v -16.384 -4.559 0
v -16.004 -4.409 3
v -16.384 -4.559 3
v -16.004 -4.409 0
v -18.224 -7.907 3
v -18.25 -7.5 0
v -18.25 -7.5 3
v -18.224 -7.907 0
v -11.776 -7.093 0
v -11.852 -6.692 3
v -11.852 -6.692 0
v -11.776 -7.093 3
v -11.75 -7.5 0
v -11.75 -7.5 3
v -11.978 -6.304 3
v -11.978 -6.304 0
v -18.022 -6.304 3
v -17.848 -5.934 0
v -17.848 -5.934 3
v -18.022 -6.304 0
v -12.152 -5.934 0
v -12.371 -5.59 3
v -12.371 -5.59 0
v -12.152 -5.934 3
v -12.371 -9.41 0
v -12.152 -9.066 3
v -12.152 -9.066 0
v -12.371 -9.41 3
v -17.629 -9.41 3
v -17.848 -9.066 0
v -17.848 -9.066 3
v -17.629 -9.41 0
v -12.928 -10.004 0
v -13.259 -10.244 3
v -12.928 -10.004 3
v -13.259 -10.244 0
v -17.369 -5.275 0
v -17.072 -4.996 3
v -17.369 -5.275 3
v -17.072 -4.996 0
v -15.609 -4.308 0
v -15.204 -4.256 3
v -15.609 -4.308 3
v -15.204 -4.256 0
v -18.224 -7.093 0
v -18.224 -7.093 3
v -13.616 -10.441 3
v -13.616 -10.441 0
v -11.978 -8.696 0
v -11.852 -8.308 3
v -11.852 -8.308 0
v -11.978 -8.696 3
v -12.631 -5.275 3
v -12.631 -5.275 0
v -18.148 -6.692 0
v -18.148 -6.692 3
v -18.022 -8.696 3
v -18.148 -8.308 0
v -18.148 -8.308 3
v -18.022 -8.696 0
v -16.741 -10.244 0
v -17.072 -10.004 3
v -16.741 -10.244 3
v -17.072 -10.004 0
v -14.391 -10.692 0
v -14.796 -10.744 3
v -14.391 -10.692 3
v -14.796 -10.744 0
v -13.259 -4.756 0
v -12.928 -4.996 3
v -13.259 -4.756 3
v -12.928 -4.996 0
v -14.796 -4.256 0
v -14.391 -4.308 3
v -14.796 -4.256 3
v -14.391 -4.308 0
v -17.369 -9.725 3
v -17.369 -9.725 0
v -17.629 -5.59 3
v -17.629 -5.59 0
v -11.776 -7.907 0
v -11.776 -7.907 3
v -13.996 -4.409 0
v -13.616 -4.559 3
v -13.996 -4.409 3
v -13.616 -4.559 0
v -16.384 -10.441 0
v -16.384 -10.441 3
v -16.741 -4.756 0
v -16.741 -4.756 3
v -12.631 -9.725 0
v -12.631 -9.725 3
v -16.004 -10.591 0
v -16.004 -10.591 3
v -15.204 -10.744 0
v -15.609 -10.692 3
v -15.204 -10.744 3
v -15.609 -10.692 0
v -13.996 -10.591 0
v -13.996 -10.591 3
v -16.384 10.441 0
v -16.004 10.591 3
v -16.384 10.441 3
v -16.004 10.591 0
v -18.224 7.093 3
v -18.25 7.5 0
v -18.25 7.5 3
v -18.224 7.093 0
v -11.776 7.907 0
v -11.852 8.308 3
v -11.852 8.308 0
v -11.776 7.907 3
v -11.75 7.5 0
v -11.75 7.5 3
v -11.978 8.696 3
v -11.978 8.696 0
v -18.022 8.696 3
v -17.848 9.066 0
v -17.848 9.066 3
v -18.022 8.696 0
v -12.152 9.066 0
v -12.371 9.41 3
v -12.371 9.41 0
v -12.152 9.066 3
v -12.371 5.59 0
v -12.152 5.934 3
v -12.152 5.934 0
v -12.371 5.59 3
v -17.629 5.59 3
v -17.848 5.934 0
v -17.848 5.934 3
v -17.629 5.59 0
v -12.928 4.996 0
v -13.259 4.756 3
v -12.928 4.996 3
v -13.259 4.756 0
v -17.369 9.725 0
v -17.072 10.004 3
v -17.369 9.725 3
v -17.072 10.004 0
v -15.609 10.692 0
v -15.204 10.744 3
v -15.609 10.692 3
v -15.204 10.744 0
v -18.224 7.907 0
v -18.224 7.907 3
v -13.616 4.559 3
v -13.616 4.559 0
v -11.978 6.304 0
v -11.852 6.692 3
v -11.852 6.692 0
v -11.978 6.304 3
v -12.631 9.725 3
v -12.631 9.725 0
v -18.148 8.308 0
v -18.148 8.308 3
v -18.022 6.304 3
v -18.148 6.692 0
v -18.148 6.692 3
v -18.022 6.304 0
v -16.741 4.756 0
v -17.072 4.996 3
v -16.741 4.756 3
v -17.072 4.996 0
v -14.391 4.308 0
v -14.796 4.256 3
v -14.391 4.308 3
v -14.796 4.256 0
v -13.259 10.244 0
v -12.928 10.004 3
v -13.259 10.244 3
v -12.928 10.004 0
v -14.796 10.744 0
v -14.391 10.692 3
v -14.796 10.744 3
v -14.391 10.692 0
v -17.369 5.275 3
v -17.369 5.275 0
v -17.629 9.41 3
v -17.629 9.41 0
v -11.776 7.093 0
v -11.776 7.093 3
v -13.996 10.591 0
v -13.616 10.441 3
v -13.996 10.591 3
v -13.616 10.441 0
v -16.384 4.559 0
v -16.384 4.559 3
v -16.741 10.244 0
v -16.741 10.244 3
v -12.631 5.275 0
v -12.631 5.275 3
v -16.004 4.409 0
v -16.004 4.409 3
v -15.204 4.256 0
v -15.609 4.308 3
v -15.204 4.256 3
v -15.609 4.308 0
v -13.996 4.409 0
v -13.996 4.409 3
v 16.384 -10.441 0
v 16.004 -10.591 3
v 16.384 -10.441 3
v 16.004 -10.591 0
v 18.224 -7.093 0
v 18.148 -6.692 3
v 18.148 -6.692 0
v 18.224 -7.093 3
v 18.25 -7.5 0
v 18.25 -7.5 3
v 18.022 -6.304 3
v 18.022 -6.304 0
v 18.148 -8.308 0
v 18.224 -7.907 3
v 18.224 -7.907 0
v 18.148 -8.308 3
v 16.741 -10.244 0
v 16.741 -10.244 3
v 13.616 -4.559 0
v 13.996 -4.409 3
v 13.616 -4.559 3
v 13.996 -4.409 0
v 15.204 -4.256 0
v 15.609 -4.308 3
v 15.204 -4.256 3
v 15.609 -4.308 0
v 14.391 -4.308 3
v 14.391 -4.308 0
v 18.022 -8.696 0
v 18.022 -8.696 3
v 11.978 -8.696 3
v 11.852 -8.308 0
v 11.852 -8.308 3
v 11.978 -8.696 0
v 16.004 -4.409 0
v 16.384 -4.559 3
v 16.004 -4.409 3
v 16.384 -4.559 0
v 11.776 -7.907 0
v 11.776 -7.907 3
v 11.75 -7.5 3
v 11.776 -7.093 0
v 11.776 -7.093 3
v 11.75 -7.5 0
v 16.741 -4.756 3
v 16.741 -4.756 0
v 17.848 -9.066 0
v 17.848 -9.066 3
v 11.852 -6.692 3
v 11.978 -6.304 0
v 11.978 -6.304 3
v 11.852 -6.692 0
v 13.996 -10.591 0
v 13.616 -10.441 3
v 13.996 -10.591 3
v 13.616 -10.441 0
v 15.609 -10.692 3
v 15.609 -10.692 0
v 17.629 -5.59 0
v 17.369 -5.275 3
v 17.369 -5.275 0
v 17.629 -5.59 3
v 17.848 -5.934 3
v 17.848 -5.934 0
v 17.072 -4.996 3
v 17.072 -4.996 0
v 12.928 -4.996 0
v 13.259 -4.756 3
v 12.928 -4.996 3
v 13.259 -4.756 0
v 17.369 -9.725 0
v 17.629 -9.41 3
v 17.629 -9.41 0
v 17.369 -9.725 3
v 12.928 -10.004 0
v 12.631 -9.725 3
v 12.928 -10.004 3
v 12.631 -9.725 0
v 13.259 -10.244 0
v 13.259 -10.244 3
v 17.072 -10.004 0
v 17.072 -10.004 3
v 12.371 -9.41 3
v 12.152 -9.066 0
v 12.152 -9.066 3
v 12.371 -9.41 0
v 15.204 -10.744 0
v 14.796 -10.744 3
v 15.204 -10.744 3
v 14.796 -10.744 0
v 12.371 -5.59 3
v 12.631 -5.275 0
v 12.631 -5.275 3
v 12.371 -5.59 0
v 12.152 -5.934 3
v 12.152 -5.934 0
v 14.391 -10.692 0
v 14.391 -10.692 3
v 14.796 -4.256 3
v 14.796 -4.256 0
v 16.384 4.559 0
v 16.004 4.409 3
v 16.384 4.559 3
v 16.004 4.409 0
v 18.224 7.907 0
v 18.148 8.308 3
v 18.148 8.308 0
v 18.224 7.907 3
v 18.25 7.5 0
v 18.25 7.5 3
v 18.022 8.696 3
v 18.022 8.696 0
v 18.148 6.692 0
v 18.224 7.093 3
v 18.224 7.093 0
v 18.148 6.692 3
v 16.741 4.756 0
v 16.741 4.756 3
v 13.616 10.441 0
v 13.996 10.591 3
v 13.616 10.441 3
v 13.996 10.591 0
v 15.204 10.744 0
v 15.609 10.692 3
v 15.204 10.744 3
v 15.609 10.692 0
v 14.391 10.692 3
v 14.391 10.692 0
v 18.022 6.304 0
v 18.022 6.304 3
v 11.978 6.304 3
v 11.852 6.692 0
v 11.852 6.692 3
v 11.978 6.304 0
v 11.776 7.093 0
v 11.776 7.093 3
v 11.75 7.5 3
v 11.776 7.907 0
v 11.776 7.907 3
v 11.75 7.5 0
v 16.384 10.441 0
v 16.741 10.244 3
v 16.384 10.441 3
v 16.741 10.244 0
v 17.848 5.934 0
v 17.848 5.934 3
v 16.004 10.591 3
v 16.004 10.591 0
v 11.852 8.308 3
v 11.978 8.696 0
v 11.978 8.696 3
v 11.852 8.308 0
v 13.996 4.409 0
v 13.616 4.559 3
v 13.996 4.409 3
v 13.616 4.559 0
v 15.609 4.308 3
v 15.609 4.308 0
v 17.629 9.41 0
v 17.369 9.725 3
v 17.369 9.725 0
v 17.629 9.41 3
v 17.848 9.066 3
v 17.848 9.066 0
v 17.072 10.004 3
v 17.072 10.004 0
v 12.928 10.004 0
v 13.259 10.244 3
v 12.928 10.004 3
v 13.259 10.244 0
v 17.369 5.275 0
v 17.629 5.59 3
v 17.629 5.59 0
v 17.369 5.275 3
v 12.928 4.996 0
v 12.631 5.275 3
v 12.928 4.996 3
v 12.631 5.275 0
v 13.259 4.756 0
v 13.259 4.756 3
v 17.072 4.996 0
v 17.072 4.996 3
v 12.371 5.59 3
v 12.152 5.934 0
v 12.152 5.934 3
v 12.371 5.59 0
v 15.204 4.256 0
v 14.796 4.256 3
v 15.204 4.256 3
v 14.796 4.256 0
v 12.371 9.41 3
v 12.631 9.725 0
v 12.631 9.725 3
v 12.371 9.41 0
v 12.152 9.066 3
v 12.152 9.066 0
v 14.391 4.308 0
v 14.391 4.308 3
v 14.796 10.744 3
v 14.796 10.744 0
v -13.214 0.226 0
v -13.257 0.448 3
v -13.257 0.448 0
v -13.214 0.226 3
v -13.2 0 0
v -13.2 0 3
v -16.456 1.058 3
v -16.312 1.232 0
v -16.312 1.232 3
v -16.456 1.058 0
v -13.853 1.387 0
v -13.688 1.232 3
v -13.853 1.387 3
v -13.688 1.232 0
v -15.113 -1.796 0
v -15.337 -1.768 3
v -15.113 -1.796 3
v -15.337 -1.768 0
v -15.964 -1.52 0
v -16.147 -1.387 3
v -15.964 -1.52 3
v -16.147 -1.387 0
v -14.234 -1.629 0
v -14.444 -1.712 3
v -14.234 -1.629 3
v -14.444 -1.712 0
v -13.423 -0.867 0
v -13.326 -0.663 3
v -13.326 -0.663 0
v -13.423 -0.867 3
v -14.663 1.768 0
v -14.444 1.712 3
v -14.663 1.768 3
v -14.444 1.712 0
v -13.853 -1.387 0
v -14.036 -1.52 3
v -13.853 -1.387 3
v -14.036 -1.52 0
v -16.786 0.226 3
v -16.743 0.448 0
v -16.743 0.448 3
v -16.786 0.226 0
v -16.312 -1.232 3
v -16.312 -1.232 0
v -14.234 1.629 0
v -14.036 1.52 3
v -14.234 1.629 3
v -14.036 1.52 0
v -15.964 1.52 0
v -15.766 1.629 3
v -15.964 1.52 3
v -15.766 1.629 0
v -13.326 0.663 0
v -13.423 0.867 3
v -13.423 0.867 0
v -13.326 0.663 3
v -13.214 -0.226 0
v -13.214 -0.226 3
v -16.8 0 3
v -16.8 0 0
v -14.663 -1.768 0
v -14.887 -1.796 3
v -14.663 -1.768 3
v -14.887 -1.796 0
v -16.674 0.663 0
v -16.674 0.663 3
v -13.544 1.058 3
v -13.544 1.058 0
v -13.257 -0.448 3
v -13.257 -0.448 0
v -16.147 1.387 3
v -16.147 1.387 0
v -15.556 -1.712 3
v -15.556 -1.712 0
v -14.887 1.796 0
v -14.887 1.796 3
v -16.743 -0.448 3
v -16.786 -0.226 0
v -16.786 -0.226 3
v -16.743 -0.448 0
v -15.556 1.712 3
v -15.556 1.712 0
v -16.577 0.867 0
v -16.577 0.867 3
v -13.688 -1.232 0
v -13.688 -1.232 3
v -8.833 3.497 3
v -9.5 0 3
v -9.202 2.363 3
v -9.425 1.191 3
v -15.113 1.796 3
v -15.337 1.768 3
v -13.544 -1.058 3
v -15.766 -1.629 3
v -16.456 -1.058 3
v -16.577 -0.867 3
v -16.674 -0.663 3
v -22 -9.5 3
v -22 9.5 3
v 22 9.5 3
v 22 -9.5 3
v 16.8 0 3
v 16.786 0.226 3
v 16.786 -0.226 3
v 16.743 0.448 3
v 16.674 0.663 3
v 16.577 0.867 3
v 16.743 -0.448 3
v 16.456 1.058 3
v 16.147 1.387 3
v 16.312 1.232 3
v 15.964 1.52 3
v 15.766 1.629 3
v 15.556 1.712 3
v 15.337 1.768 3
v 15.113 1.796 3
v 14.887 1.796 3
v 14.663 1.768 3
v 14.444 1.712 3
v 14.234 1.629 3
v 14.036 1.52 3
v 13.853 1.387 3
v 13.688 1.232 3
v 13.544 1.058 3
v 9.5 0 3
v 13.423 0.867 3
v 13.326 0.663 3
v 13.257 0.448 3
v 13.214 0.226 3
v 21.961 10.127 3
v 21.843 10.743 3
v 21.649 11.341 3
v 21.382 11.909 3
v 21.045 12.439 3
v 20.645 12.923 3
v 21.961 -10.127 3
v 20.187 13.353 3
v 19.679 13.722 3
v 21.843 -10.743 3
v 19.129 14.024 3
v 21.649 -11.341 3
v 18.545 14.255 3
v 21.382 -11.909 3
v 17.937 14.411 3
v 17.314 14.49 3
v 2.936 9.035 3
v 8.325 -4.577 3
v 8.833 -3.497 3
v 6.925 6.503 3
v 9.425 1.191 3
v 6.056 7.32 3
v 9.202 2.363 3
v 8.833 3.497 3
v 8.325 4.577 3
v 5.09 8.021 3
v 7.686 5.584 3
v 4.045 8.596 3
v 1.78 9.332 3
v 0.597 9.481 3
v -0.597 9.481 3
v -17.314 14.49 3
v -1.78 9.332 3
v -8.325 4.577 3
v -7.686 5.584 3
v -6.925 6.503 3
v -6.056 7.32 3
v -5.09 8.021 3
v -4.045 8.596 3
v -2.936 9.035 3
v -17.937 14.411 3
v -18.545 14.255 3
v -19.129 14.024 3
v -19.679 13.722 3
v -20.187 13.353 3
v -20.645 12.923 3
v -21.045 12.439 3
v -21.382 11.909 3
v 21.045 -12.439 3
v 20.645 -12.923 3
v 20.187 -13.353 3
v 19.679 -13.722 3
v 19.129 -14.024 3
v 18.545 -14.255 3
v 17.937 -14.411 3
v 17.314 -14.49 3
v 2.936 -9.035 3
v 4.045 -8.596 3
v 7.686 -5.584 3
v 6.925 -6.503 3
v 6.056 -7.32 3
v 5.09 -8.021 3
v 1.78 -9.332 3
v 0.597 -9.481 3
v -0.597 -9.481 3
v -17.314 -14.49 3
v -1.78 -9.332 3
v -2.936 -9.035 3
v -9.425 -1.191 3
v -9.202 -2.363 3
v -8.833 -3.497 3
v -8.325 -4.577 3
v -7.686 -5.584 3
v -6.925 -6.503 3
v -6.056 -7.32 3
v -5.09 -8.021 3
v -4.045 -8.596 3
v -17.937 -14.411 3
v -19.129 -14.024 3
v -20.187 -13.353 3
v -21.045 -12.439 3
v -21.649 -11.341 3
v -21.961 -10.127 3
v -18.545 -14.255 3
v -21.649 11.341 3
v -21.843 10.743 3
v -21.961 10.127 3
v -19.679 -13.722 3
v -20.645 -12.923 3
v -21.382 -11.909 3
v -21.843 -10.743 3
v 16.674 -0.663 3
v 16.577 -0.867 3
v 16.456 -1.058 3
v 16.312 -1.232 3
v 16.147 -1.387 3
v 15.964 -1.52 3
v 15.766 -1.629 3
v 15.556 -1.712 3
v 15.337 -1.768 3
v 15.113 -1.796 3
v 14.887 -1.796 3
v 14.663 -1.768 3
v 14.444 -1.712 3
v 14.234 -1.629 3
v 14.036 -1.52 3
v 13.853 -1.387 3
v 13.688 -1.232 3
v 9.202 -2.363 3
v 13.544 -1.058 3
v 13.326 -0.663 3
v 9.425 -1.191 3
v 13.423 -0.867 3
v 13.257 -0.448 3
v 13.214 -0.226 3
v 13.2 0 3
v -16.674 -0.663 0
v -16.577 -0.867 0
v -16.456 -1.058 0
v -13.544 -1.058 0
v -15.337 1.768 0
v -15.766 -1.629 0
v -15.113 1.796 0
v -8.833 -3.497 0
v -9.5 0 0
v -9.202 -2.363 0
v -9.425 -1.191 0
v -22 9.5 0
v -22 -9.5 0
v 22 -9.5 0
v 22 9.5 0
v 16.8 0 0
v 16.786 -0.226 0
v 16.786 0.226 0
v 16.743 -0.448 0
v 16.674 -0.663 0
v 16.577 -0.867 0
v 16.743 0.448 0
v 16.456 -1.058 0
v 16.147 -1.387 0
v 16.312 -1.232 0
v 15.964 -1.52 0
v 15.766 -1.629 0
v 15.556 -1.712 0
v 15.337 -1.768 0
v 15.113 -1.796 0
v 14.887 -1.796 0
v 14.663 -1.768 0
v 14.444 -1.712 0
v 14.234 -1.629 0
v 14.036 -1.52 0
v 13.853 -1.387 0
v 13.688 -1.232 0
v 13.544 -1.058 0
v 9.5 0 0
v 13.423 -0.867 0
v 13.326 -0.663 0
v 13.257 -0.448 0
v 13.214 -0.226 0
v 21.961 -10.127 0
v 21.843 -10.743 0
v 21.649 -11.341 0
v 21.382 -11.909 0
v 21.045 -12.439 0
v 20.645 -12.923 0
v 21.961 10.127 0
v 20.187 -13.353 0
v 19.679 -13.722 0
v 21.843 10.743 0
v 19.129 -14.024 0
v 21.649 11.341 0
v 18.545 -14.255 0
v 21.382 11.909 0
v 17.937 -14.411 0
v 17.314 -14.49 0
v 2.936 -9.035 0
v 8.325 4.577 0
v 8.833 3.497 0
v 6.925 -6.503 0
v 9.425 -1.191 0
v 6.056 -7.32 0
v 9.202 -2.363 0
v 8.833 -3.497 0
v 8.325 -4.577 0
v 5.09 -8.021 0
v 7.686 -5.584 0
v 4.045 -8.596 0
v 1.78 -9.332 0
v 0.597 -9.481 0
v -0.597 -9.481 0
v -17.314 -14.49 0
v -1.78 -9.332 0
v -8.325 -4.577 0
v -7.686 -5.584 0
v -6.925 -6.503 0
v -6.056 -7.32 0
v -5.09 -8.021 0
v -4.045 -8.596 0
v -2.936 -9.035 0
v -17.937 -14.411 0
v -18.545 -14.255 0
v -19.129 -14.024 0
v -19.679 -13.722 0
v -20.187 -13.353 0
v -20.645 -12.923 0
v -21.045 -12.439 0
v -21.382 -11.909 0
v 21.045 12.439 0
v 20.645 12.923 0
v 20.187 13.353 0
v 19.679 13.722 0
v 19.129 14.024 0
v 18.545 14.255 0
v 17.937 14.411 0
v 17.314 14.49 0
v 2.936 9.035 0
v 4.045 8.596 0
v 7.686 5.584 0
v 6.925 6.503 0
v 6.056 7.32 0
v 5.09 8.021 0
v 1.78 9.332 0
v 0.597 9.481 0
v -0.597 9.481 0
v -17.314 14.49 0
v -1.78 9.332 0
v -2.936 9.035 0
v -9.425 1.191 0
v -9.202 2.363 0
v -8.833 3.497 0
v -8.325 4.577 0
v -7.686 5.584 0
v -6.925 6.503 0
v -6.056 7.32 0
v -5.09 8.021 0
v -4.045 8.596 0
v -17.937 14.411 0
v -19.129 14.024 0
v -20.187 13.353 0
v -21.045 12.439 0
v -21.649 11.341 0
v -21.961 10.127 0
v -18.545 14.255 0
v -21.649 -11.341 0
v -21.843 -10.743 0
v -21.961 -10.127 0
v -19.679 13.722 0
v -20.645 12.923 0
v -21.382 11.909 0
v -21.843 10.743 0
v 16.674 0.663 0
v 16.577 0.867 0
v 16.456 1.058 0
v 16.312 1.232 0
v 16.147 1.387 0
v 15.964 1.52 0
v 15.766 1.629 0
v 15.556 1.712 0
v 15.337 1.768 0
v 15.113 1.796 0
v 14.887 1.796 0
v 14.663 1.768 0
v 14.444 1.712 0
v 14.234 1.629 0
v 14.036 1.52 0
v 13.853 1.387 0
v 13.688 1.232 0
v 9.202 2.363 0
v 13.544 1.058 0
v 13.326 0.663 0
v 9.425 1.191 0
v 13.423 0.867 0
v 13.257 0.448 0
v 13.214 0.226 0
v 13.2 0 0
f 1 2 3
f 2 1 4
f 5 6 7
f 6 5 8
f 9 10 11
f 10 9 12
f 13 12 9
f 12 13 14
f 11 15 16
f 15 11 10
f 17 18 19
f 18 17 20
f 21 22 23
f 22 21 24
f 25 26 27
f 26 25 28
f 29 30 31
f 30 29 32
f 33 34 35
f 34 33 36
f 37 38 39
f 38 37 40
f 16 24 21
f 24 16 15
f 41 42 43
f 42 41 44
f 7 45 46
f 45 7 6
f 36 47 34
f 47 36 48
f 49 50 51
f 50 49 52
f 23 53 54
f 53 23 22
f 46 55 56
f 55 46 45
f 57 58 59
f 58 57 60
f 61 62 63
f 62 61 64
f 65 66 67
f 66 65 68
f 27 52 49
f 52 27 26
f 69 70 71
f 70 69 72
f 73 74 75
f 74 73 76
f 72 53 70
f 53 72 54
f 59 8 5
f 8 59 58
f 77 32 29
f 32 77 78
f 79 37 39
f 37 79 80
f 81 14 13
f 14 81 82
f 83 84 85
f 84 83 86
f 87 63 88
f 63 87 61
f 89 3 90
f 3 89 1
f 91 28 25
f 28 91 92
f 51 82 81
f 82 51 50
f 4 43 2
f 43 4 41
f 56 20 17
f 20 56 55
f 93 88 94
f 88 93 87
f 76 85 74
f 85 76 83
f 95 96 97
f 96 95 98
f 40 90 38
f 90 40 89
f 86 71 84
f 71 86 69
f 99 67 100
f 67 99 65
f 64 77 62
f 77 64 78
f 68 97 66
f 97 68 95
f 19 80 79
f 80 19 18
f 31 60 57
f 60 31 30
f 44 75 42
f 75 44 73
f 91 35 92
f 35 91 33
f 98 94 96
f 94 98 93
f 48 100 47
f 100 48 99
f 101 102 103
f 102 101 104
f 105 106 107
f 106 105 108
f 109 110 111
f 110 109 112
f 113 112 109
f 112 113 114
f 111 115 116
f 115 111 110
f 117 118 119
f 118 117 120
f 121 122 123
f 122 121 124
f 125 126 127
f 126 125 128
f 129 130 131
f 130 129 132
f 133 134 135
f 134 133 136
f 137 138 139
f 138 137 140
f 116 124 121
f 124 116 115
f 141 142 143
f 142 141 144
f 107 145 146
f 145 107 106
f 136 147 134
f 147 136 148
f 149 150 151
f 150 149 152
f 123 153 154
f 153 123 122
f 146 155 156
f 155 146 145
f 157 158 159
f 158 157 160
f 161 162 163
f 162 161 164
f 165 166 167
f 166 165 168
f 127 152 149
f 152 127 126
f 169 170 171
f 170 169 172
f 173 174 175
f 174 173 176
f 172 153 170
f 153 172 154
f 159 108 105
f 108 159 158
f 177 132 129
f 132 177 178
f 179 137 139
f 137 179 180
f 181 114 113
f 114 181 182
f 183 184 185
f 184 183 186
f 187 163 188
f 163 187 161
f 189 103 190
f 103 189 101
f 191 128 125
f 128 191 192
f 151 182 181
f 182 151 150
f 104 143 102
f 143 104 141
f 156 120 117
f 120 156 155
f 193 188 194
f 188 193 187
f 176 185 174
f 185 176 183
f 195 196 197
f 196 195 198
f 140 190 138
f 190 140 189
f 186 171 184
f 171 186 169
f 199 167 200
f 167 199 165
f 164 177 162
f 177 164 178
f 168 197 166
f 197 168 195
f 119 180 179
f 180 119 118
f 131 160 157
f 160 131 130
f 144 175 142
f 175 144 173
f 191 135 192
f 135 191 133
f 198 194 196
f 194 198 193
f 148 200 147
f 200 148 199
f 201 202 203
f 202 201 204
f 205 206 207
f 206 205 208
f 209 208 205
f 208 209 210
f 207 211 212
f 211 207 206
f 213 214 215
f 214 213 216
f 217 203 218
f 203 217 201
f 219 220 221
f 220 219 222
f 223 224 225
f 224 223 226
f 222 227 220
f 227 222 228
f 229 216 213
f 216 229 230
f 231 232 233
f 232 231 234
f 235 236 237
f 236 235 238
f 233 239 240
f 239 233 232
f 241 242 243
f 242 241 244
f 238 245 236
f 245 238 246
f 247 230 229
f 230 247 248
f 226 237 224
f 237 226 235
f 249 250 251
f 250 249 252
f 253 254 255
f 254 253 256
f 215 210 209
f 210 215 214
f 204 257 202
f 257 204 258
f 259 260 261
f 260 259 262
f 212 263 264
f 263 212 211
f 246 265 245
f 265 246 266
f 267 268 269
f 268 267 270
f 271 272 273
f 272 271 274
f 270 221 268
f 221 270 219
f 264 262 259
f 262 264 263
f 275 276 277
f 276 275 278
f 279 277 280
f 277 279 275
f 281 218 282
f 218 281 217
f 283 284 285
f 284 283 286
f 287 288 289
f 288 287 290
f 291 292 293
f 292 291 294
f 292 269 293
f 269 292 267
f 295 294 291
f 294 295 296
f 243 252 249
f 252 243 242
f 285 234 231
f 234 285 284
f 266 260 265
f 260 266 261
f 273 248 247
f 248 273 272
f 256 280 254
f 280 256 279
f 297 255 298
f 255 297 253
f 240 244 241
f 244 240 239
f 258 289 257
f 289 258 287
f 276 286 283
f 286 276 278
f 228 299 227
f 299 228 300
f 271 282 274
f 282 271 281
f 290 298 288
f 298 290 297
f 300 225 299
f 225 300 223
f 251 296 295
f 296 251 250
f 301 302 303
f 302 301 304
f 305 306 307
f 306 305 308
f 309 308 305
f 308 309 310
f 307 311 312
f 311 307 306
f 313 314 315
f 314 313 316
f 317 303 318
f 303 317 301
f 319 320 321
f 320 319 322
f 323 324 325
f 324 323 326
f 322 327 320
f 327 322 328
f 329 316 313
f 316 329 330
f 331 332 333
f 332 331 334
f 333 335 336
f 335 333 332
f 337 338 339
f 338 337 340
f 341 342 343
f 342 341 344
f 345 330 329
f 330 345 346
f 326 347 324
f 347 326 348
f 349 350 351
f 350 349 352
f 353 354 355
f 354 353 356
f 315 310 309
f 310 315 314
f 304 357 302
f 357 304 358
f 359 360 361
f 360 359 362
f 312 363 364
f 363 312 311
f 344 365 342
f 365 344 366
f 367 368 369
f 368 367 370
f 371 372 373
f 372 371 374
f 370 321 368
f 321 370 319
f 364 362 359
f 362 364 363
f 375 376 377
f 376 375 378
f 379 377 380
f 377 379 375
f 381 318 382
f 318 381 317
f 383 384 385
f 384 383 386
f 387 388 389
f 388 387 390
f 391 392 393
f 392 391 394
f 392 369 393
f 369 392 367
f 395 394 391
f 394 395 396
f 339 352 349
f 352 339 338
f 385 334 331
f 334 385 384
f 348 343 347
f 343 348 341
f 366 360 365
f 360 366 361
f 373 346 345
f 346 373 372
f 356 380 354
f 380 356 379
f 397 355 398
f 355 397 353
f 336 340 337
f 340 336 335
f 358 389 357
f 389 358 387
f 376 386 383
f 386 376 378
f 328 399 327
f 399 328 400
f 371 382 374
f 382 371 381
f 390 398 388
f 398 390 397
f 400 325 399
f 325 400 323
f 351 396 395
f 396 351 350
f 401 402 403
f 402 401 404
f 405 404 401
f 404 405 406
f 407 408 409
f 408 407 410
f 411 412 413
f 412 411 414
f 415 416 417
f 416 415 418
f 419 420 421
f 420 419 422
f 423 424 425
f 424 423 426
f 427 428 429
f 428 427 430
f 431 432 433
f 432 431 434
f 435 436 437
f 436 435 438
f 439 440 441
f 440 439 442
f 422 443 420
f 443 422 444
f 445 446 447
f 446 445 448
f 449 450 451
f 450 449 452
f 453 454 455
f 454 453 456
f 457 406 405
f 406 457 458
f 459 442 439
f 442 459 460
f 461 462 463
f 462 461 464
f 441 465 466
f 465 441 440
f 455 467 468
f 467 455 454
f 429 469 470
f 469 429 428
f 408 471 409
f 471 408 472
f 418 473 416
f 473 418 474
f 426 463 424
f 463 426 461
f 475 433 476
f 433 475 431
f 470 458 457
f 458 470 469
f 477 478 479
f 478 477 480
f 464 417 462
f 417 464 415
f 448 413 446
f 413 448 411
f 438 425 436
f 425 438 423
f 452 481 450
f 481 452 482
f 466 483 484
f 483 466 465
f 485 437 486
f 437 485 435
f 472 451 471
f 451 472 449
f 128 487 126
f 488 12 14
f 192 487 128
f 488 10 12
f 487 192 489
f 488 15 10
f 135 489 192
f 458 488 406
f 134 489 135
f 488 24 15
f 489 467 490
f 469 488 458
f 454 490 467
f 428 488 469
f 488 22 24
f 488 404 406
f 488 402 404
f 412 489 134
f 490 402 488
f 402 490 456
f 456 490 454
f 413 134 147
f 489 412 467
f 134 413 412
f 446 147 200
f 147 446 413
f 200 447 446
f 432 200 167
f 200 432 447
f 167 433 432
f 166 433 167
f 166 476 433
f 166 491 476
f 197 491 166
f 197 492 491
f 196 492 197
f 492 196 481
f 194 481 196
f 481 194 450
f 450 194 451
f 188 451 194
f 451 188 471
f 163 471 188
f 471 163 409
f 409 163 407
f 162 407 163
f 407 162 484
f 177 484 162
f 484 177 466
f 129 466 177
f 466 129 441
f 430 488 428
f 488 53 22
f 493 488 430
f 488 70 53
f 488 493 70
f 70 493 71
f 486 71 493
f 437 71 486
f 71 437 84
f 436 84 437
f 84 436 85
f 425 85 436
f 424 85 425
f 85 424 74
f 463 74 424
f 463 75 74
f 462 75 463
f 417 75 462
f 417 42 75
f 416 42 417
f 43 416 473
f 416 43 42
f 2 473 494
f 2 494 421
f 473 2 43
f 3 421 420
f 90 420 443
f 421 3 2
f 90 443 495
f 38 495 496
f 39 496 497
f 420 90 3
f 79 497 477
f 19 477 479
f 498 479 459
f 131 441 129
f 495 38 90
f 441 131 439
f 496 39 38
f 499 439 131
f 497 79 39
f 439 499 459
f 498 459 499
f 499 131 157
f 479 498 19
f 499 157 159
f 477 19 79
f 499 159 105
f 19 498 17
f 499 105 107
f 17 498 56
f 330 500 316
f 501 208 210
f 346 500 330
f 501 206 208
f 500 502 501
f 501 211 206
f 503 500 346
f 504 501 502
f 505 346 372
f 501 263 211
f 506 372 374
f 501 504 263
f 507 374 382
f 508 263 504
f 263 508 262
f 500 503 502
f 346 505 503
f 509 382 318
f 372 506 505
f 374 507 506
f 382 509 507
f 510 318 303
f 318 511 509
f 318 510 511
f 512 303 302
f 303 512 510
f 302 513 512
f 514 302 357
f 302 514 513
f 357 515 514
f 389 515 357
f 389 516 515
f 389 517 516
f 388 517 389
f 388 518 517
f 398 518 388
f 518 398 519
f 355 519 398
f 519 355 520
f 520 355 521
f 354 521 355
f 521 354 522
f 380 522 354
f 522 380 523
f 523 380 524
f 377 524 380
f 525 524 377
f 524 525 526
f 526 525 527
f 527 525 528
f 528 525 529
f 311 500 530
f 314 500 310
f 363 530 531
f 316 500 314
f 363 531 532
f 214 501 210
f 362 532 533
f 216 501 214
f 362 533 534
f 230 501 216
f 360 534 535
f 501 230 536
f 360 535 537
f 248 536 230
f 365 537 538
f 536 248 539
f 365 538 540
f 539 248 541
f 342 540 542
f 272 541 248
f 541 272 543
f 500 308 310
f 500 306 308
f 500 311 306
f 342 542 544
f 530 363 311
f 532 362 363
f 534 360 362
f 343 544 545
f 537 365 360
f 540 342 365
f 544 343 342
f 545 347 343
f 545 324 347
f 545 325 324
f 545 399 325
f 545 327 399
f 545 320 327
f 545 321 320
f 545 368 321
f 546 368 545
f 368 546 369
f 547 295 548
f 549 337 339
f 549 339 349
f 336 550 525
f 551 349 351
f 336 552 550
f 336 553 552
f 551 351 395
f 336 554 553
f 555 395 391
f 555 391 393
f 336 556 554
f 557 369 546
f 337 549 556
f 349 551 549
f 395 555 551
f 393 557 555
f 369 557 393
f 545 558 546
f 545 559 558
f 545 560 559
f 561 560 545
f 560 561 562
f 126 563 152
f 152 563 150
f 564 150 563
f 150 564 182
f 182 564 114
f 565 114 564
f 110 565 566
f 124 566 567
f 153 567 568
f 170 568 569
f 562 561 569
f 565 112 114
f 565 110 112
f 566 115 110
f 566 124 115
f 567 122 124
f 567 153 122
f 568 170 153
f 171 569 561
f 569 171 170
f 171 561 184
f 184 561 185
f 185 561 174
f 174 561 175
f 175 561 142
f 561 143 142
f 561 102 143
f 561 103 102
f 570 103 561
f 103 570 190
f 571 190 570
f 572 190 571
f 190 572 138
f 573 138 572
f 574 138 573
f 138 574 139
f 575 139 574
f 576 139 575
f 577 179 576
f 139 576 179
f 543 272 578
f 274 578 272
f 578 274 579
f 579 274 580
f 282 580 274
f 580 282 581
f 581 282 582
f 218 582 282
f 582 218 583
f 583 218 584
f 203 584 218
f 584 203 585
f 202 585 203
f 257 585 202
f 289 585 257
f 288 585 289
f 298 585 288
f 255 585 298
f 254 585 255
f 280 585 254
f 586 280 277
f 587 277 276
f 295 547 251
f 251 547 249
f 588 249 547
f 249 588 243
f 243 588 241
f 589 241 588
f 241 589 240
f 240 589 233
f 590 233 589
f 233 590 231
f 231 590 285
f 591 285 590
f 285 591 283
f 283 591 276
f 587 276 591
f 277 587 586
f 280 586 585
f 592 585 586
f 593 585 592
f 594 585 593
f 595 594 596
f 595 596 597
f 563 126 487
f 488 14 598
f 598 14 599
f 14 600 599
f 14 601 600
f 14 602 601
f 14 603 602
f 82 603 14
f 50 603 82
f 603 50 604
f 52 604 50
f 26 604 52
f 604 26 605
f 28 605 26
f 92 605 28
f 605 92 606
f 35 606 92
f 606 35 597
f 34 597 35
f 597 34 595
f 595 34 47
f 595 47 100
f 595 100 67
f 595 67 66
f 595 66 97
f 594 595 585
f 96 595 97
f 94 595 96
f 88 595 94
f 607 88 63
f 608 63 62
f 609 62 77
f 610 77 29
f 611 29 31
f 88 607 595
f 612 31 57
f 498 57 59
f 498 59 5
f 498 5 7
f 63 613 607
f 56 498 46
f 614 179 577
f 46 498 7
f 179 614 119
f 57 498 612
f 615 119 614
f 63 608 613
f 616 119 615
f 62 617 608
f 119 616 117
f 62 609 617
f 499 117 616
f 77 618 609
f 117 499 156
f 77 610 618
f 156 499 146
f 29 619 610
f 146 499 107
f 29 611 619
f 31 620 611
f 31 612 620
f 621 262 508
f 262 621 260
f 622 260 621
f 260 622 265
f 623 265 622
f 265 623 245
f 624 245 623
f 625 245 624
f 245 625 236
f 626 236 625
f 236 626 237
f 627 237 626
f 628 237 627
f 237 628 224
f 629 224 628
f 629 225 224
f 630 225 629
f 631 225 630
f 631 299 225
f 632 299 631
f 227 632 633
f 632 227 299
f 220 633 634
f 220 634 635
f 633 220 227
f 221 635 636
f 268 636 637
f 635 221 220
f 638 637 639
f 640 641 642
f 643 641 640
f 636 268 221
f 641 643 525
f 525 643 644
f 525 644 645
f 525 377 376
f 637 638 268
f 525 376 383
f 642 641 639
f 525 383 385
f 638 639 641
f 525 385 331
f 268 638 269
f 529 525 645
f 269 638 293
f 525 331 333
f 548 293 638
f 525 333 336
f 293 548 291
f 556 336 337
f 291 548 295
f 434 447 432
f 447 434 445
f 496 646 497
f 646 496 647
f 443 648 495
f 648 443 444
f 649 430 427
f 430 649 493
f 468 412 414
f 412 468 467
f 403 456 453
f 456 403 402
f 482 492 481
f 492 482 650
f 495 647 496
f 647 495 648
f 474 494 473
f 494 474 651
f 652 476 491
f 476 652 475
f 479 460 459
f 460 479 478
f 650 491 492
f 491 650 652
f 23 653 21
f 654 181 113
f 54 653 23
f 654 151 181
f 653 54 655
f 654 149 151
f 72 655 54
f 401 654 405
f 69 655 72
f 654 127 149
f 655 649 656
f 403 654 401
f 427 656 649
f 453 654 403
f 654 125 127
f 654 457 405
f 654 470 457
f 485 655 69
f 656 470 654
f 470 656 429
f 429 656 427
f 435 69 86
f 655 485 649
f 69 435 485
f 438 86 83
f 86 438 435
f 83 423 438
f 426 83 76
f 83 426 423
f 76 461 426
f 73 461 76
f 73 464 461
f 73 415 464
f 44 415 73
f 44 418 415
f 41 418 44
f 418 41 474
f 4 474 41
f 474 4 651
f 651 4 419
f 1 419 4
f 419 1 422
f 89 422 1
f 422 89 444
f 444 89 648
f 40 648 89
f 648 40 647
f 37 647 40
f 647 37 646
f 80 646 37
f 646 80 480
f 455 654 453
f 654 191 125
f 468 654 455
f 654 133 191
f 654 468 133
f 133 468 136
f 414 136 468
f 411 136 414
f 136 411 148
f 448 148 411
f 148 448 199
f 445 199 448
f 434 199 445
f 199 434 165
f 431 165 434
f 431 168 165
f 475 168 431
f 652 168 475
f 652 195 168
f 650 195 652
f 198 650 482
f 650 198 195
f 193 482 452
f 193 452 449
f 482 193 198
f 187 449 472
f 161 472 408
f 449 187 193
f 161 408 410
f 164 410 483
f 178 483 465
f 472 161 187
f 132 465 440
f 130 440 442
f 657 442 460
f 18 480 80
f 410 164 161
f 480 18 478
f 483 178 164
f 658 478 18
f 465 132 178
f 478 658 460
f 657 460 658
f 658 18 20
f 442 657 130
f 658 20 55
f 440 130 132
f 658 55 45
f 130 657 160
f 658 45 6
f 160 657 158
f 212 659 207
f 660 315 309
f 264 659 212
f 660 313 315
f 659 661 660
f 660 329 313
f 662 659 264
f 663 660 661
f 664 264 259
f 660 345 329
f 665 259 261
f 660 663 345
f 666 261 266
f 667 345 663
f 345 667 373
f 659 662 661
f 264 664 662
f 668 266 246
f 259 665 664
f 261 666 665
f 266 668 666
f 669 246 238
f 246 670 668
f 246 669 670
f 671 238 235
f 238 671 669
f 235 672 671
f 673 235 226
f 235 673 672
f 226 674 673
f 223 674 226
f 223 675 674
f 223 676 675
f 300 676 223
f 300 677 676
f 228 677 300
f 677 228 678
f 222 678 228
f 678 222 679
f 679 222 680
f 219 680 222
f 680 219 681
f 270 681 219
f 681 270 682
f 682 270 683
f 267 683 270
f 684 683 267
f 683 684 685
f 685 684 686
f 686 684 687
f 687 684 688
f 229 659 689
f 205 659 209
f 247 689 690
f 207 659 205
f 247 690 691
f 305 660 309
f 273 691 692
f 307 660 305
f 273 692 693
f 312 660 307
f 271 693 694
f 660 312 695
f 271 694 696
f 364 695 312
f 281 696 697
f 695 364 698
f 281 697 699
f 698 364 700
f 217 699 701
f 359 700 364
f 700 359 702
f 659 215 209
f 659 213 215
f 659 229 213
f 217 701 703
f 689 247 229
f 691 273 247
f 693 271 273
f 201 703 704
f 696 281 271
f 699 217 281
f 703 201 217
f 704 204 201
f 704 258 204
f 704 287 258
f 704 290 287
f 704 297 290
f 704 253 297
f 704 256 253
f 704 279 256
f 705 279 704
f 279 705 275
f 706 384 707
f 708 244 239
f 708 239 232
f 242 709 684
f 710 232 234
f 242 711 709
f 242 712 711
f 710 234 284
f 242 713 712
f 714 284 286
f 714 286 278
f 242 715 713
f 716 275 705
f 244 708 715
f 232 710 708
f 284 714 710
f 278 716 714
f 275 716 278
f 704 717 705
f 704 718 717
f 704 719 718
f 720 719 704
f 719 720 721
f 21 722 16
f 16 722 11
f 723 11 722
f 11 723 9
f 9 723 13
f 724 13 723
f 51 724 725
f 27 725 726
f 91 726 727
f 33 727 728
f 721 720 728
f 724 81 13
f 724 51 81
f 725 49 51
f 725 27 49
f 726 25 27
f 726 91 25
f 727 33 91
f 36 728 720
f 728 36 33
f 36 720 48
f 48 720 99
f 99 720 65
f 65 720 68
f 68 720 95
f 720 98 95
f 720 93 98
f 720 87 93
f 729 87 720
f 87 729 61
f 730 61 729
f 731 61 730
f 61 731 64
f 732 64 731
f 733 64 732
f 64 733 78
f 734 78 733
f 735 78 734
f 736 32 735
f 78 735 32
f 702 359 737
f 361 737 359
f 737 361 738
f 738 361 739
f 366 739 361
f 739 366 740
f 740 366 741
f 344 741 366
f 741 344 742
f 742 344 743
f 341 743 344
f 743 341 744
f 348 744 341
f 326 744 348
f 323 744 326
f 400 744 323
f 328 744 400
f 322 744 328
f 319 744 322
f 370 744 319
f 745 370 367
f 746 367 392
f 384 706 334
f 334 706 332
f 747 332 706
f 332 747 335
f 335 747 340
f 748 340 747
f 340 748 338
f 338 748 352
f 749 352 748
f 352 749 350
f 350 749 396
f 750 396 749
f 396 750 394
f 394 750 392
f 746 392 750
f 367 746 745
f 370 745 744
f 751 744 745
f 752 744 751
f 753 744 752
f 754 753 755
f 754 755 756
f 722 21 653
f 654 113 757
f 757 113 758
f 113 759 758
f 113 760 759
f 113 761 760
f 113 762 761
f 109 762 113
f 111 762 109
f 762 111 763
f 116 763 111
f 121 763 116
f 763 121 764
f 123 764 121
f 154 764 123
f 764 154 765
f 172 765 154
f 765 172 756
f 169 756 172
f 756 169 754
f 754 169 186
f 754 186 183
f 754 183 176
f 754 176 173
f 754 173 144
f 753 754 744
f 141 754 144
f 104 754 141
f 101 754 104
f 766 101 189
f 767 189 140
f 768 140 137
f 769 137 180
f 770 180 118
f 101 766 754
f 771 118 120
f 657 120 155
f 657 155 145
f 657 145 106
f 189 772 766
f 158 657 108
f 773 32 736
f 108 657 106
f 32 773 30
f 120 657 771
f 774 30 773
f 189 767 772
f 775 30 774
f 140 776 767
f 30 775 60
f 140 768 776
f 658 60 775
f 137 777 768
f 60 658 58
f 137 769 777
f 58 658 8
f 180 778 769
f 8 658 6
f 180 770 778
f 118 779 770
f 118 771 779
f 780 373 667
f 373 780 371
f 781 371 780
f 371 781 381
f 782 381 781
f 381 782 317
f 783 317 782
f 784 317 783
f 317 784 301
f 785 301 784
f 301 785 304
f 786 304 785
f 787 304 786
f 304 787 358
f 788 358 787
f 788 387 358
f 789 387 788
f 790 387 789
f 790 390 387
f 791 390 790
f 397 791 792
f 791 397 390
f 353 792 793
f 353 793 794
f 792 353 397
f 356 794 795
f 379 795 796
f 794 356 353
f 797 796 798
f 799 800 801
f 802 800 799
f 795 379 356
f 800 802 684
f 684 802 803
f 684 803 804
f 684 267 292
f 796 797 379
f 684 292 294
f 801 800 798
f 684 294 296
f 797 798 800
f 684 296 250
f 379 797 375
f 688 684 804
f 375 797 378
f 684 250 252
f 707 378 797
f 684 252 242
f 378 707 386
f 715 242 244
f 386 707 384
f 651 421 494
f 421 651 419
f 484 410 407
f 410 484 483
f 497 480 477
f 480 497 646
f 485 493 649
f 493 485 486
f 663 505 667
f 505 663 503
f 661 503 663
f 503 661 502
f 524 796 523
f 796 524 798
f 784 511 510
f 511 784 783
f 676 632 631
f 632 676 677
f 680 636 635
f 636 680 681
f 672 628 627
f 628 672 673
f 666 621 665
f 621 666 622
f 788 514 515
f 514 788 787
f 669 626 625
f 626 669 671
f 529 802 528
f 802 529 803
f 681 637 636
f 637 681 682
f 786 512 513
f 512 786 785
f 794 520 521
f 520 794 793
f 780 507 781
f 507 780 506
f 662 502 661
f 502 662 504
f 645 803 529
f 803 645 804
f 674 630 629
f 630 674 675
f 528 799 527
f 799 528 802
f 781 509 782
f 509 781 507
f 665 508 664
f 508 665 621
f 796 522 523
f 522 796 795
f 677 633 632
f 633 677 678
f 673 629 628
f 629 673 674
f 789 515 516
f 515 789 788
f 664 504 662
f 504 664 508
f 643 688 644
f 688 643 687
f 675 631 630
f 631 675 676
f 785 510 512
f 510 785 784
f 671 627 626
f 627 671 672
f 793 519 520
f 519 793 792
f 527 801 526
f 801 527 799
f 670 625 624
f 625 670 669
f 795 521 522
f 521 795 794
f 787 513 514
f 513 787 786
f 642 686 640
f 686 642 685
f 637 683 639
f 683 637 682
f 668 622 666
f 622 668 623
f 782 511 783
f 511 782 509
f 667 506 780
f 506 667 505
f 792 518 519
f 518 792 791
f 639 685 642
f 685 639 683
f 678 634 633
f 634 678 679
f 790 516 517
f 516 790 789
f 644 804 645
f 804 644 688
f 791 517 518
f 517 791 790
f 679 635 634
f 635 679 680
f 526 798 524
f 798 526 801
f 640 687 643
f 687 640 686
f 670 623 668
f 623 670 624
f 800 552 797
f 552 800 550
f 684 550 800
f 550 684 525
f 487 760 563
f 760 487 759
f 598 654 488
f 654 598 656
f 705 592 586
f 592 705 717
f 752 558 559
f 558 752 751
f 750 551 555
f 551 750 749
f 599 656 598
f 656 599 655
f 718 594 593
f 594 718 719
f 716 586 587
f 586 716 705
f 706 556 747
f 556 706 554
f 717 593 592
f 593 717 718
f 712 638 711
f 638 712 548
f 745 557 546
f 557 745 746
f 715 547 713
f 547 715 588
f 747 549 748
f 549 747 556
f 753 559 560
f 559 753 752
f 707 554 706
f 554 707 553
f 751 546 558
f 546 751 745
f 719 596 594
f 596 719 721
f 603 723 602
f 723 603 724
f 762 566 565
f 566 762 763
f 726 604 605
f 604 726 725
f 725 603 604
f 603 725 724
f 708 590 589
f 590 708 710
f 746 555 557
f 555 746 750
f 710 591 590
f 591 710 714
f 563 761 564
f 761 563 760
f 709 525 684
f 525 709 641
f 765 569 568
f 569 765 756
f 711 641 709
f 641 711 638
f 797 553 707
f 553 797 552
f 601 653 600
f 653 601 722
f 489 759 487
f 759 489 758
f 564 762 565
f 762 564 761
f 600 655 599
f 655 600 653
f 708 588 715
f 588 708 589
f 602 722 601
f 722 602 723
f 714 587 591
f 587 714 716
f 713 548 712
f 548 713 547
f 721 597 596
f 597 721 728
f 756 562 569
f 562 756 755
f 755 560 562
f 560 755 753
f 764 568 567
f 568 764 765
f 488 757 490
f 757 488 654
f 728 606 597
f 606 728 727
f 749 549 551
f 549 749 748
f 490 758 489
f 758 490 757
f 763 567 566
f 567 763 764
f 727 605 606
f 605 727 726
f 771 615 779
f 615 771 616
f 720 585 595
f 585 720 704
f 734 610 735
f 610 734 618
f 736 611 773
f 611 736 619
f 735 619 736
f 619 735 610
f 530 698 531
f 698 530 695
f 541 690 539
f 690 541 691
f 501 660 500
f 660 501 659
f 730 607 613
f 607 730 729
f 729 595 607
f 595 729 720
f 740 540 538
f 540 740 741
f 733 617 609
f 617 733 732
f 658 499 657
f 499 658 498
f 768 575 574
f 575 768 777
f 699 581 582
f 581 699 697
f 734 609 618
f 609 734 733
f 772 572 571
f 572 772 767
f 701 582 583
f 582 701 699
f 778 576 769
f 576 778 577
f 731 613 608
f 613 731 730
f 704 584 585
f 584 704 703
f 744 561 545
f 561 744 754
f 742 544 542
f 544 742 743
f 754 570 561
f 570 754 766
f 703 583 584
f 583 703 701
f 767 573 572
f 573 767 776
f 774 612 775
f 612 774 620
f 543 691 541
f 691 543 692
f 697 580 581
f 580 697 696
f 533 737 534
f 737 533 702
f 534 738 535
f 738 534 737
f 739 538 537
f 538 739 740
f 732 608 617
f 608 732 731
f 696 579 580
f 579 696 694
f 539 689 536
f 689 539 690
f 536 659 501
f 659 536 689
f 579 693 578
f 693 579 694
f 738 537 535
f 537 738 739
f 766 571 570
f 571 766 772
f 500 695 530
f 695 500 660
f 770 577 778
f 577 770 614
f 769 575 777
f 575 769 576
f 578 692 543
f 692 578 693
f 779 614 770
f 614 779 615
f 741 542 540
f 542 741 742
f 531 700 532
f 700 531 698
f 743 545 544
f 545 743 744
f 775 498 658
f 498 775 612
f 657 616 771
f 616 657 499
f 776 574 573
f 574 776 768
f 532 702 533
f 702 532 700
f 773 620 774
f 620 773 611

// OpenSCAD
$fn = 50;


difference() {
	union() {
		hull() {
			translate(v = [-17.0000000000, 9.5000000000, 0]) {
				cylinder(h = 3, r = 5);
			}
			translate(v = [17.0000000000, 9.5000000000, 0]) {
				cylinder(h = 3, r = 5);
			}
			translate(v = [-17.0000000000, -9.5000000000, 0]) {
				cylinder(h = 3, r = 5);
			}
			translate(v = [17.0000000000, -9.5000000000, 0]) {
				cylinder(h = 3, r = 5);
			}
		}
	}
	union() {
		#translate(v = [-15.0000000000, -7.5000000000, 0]) {
			cylinder(h = 3, r = 3.2500000000);
		}
		#translate(v = [-15.0000000000, 7.5000000000, 0]) {
			cylinder(h = 3, r = 3.2500000000);
		}
		#translate(v = [15.0000000000, -7.5000000000, 0]) {
			cylinder(h = 3, r = 3.2500000000);
		}
		#translate(v = [15.0000000000, 7.5000000000, 0]) {
			cylinder(h = 3, r = 3.2500000000);
		}
		#translate(v = [-15.0000000000, -7.5000000000, -100.0000000000]) {
			cylinder(h = 200, r = 3.2500000000);
		}
		#translate(v = [-15.0000000000, 7.5000000000, -100.0000000000]) {
			cylinder(h = 200, r = 3.2500000000);
		}
		#translate(v = [15.0000000000, -7.5000000000, -100.0000000000]) {
			cylinder(h = 200, r = 3.2500000000);
		}
		#translate(v = [15.0000000000, 7.5000000000, -100.0000000000]) {
			cylinder(h = 200, r = 3.2500000000);
		}
		#translate(v = [-15.0000000000, -7.5000000000, 0]) {
			cylinder(h = 3, r = 1.8000000000);
		}
		#translate(v = [-15.0000000000, 0.0000000000, 0]) {
			cylinder(h = 3, r = 1.8000000000);
		}
		#translate(v = [-15.0000000000, 7.5000000000, 0]) {
			cylinder(h = 3, r = 1.8000000000);
		}
		#translate(v = [15.0000000000, -7.5000000000, 0]) {
			cylinder(h = 3, r = 1.8000000000);
		}
		#translate(v = [15.0000000000, 0.0000000000, 0]) {
			cylinder(h = 3, r = 1.8000000000);
		}
		#translate(v = [15.0000000000, 7.5000000000, 0]) {
			cylinder(h = 3, r = 1.8000000000);
		}
		#translate(v = [-15.0000000000, -7.5000000000, 0]) {
			cylinder(h = 3, r = 1.8000000000);
		}
		#translate(v = [-15.0000000000, 0.0000000000, 0]) {
			cylinder(h = 3, r = 1.8000000000);
		}
		#translate(v = [-15.0000000000, 7.5000000000, 0]) {
			cylinder(h = 3, r = 1.8000000000);
		}
		#translate(v = [15.0000000000, -7.5000000000, 0]) {
			cylinder(h = 3, r = 1.8000000000);
		}
		#translate(v = [15.0000000000, 0.0000000000, 0]) {
			cylinder(h = 3, r = 1.8000000000);
		}
		#translate(v = [15.0000000000, 7.5000000000, 0]) {
			cylinder(h = 3, r = 1.8000000000);
		}
		#translate(v = [-15.0000000000, -7.5000000000, 0]) {
			cylinder(h = 3, r = 1.8000000000);
		}
		#translate(v = [-15.0000000000, 0.0000000000, 0]) {
			cylinder(h = 3, r = 1.8000000000);
		}
		#translate(v = [-15.0000000000, 7.5000000000, 0]) {
			cylinder(h = 3, r = 1.8000000000);
		}
		#translate(v = [15.0000000000, -7.5000000000, 0]) {
			cylinder(h = 3, r = 1.8000000000);
		}
		#translate(v = [15.0000000000, 0.0000000000, 0]) {
			cylinder(h = 3, r = 1.8000000000);
		}
		#translate(v = [15.0000000000, 7.5000000000, 0]) {
			cylinder(h = 3, r = 1.8000000000);
		}
		#cylinder(h = 3, r = 9.5000000000);
	}
}
